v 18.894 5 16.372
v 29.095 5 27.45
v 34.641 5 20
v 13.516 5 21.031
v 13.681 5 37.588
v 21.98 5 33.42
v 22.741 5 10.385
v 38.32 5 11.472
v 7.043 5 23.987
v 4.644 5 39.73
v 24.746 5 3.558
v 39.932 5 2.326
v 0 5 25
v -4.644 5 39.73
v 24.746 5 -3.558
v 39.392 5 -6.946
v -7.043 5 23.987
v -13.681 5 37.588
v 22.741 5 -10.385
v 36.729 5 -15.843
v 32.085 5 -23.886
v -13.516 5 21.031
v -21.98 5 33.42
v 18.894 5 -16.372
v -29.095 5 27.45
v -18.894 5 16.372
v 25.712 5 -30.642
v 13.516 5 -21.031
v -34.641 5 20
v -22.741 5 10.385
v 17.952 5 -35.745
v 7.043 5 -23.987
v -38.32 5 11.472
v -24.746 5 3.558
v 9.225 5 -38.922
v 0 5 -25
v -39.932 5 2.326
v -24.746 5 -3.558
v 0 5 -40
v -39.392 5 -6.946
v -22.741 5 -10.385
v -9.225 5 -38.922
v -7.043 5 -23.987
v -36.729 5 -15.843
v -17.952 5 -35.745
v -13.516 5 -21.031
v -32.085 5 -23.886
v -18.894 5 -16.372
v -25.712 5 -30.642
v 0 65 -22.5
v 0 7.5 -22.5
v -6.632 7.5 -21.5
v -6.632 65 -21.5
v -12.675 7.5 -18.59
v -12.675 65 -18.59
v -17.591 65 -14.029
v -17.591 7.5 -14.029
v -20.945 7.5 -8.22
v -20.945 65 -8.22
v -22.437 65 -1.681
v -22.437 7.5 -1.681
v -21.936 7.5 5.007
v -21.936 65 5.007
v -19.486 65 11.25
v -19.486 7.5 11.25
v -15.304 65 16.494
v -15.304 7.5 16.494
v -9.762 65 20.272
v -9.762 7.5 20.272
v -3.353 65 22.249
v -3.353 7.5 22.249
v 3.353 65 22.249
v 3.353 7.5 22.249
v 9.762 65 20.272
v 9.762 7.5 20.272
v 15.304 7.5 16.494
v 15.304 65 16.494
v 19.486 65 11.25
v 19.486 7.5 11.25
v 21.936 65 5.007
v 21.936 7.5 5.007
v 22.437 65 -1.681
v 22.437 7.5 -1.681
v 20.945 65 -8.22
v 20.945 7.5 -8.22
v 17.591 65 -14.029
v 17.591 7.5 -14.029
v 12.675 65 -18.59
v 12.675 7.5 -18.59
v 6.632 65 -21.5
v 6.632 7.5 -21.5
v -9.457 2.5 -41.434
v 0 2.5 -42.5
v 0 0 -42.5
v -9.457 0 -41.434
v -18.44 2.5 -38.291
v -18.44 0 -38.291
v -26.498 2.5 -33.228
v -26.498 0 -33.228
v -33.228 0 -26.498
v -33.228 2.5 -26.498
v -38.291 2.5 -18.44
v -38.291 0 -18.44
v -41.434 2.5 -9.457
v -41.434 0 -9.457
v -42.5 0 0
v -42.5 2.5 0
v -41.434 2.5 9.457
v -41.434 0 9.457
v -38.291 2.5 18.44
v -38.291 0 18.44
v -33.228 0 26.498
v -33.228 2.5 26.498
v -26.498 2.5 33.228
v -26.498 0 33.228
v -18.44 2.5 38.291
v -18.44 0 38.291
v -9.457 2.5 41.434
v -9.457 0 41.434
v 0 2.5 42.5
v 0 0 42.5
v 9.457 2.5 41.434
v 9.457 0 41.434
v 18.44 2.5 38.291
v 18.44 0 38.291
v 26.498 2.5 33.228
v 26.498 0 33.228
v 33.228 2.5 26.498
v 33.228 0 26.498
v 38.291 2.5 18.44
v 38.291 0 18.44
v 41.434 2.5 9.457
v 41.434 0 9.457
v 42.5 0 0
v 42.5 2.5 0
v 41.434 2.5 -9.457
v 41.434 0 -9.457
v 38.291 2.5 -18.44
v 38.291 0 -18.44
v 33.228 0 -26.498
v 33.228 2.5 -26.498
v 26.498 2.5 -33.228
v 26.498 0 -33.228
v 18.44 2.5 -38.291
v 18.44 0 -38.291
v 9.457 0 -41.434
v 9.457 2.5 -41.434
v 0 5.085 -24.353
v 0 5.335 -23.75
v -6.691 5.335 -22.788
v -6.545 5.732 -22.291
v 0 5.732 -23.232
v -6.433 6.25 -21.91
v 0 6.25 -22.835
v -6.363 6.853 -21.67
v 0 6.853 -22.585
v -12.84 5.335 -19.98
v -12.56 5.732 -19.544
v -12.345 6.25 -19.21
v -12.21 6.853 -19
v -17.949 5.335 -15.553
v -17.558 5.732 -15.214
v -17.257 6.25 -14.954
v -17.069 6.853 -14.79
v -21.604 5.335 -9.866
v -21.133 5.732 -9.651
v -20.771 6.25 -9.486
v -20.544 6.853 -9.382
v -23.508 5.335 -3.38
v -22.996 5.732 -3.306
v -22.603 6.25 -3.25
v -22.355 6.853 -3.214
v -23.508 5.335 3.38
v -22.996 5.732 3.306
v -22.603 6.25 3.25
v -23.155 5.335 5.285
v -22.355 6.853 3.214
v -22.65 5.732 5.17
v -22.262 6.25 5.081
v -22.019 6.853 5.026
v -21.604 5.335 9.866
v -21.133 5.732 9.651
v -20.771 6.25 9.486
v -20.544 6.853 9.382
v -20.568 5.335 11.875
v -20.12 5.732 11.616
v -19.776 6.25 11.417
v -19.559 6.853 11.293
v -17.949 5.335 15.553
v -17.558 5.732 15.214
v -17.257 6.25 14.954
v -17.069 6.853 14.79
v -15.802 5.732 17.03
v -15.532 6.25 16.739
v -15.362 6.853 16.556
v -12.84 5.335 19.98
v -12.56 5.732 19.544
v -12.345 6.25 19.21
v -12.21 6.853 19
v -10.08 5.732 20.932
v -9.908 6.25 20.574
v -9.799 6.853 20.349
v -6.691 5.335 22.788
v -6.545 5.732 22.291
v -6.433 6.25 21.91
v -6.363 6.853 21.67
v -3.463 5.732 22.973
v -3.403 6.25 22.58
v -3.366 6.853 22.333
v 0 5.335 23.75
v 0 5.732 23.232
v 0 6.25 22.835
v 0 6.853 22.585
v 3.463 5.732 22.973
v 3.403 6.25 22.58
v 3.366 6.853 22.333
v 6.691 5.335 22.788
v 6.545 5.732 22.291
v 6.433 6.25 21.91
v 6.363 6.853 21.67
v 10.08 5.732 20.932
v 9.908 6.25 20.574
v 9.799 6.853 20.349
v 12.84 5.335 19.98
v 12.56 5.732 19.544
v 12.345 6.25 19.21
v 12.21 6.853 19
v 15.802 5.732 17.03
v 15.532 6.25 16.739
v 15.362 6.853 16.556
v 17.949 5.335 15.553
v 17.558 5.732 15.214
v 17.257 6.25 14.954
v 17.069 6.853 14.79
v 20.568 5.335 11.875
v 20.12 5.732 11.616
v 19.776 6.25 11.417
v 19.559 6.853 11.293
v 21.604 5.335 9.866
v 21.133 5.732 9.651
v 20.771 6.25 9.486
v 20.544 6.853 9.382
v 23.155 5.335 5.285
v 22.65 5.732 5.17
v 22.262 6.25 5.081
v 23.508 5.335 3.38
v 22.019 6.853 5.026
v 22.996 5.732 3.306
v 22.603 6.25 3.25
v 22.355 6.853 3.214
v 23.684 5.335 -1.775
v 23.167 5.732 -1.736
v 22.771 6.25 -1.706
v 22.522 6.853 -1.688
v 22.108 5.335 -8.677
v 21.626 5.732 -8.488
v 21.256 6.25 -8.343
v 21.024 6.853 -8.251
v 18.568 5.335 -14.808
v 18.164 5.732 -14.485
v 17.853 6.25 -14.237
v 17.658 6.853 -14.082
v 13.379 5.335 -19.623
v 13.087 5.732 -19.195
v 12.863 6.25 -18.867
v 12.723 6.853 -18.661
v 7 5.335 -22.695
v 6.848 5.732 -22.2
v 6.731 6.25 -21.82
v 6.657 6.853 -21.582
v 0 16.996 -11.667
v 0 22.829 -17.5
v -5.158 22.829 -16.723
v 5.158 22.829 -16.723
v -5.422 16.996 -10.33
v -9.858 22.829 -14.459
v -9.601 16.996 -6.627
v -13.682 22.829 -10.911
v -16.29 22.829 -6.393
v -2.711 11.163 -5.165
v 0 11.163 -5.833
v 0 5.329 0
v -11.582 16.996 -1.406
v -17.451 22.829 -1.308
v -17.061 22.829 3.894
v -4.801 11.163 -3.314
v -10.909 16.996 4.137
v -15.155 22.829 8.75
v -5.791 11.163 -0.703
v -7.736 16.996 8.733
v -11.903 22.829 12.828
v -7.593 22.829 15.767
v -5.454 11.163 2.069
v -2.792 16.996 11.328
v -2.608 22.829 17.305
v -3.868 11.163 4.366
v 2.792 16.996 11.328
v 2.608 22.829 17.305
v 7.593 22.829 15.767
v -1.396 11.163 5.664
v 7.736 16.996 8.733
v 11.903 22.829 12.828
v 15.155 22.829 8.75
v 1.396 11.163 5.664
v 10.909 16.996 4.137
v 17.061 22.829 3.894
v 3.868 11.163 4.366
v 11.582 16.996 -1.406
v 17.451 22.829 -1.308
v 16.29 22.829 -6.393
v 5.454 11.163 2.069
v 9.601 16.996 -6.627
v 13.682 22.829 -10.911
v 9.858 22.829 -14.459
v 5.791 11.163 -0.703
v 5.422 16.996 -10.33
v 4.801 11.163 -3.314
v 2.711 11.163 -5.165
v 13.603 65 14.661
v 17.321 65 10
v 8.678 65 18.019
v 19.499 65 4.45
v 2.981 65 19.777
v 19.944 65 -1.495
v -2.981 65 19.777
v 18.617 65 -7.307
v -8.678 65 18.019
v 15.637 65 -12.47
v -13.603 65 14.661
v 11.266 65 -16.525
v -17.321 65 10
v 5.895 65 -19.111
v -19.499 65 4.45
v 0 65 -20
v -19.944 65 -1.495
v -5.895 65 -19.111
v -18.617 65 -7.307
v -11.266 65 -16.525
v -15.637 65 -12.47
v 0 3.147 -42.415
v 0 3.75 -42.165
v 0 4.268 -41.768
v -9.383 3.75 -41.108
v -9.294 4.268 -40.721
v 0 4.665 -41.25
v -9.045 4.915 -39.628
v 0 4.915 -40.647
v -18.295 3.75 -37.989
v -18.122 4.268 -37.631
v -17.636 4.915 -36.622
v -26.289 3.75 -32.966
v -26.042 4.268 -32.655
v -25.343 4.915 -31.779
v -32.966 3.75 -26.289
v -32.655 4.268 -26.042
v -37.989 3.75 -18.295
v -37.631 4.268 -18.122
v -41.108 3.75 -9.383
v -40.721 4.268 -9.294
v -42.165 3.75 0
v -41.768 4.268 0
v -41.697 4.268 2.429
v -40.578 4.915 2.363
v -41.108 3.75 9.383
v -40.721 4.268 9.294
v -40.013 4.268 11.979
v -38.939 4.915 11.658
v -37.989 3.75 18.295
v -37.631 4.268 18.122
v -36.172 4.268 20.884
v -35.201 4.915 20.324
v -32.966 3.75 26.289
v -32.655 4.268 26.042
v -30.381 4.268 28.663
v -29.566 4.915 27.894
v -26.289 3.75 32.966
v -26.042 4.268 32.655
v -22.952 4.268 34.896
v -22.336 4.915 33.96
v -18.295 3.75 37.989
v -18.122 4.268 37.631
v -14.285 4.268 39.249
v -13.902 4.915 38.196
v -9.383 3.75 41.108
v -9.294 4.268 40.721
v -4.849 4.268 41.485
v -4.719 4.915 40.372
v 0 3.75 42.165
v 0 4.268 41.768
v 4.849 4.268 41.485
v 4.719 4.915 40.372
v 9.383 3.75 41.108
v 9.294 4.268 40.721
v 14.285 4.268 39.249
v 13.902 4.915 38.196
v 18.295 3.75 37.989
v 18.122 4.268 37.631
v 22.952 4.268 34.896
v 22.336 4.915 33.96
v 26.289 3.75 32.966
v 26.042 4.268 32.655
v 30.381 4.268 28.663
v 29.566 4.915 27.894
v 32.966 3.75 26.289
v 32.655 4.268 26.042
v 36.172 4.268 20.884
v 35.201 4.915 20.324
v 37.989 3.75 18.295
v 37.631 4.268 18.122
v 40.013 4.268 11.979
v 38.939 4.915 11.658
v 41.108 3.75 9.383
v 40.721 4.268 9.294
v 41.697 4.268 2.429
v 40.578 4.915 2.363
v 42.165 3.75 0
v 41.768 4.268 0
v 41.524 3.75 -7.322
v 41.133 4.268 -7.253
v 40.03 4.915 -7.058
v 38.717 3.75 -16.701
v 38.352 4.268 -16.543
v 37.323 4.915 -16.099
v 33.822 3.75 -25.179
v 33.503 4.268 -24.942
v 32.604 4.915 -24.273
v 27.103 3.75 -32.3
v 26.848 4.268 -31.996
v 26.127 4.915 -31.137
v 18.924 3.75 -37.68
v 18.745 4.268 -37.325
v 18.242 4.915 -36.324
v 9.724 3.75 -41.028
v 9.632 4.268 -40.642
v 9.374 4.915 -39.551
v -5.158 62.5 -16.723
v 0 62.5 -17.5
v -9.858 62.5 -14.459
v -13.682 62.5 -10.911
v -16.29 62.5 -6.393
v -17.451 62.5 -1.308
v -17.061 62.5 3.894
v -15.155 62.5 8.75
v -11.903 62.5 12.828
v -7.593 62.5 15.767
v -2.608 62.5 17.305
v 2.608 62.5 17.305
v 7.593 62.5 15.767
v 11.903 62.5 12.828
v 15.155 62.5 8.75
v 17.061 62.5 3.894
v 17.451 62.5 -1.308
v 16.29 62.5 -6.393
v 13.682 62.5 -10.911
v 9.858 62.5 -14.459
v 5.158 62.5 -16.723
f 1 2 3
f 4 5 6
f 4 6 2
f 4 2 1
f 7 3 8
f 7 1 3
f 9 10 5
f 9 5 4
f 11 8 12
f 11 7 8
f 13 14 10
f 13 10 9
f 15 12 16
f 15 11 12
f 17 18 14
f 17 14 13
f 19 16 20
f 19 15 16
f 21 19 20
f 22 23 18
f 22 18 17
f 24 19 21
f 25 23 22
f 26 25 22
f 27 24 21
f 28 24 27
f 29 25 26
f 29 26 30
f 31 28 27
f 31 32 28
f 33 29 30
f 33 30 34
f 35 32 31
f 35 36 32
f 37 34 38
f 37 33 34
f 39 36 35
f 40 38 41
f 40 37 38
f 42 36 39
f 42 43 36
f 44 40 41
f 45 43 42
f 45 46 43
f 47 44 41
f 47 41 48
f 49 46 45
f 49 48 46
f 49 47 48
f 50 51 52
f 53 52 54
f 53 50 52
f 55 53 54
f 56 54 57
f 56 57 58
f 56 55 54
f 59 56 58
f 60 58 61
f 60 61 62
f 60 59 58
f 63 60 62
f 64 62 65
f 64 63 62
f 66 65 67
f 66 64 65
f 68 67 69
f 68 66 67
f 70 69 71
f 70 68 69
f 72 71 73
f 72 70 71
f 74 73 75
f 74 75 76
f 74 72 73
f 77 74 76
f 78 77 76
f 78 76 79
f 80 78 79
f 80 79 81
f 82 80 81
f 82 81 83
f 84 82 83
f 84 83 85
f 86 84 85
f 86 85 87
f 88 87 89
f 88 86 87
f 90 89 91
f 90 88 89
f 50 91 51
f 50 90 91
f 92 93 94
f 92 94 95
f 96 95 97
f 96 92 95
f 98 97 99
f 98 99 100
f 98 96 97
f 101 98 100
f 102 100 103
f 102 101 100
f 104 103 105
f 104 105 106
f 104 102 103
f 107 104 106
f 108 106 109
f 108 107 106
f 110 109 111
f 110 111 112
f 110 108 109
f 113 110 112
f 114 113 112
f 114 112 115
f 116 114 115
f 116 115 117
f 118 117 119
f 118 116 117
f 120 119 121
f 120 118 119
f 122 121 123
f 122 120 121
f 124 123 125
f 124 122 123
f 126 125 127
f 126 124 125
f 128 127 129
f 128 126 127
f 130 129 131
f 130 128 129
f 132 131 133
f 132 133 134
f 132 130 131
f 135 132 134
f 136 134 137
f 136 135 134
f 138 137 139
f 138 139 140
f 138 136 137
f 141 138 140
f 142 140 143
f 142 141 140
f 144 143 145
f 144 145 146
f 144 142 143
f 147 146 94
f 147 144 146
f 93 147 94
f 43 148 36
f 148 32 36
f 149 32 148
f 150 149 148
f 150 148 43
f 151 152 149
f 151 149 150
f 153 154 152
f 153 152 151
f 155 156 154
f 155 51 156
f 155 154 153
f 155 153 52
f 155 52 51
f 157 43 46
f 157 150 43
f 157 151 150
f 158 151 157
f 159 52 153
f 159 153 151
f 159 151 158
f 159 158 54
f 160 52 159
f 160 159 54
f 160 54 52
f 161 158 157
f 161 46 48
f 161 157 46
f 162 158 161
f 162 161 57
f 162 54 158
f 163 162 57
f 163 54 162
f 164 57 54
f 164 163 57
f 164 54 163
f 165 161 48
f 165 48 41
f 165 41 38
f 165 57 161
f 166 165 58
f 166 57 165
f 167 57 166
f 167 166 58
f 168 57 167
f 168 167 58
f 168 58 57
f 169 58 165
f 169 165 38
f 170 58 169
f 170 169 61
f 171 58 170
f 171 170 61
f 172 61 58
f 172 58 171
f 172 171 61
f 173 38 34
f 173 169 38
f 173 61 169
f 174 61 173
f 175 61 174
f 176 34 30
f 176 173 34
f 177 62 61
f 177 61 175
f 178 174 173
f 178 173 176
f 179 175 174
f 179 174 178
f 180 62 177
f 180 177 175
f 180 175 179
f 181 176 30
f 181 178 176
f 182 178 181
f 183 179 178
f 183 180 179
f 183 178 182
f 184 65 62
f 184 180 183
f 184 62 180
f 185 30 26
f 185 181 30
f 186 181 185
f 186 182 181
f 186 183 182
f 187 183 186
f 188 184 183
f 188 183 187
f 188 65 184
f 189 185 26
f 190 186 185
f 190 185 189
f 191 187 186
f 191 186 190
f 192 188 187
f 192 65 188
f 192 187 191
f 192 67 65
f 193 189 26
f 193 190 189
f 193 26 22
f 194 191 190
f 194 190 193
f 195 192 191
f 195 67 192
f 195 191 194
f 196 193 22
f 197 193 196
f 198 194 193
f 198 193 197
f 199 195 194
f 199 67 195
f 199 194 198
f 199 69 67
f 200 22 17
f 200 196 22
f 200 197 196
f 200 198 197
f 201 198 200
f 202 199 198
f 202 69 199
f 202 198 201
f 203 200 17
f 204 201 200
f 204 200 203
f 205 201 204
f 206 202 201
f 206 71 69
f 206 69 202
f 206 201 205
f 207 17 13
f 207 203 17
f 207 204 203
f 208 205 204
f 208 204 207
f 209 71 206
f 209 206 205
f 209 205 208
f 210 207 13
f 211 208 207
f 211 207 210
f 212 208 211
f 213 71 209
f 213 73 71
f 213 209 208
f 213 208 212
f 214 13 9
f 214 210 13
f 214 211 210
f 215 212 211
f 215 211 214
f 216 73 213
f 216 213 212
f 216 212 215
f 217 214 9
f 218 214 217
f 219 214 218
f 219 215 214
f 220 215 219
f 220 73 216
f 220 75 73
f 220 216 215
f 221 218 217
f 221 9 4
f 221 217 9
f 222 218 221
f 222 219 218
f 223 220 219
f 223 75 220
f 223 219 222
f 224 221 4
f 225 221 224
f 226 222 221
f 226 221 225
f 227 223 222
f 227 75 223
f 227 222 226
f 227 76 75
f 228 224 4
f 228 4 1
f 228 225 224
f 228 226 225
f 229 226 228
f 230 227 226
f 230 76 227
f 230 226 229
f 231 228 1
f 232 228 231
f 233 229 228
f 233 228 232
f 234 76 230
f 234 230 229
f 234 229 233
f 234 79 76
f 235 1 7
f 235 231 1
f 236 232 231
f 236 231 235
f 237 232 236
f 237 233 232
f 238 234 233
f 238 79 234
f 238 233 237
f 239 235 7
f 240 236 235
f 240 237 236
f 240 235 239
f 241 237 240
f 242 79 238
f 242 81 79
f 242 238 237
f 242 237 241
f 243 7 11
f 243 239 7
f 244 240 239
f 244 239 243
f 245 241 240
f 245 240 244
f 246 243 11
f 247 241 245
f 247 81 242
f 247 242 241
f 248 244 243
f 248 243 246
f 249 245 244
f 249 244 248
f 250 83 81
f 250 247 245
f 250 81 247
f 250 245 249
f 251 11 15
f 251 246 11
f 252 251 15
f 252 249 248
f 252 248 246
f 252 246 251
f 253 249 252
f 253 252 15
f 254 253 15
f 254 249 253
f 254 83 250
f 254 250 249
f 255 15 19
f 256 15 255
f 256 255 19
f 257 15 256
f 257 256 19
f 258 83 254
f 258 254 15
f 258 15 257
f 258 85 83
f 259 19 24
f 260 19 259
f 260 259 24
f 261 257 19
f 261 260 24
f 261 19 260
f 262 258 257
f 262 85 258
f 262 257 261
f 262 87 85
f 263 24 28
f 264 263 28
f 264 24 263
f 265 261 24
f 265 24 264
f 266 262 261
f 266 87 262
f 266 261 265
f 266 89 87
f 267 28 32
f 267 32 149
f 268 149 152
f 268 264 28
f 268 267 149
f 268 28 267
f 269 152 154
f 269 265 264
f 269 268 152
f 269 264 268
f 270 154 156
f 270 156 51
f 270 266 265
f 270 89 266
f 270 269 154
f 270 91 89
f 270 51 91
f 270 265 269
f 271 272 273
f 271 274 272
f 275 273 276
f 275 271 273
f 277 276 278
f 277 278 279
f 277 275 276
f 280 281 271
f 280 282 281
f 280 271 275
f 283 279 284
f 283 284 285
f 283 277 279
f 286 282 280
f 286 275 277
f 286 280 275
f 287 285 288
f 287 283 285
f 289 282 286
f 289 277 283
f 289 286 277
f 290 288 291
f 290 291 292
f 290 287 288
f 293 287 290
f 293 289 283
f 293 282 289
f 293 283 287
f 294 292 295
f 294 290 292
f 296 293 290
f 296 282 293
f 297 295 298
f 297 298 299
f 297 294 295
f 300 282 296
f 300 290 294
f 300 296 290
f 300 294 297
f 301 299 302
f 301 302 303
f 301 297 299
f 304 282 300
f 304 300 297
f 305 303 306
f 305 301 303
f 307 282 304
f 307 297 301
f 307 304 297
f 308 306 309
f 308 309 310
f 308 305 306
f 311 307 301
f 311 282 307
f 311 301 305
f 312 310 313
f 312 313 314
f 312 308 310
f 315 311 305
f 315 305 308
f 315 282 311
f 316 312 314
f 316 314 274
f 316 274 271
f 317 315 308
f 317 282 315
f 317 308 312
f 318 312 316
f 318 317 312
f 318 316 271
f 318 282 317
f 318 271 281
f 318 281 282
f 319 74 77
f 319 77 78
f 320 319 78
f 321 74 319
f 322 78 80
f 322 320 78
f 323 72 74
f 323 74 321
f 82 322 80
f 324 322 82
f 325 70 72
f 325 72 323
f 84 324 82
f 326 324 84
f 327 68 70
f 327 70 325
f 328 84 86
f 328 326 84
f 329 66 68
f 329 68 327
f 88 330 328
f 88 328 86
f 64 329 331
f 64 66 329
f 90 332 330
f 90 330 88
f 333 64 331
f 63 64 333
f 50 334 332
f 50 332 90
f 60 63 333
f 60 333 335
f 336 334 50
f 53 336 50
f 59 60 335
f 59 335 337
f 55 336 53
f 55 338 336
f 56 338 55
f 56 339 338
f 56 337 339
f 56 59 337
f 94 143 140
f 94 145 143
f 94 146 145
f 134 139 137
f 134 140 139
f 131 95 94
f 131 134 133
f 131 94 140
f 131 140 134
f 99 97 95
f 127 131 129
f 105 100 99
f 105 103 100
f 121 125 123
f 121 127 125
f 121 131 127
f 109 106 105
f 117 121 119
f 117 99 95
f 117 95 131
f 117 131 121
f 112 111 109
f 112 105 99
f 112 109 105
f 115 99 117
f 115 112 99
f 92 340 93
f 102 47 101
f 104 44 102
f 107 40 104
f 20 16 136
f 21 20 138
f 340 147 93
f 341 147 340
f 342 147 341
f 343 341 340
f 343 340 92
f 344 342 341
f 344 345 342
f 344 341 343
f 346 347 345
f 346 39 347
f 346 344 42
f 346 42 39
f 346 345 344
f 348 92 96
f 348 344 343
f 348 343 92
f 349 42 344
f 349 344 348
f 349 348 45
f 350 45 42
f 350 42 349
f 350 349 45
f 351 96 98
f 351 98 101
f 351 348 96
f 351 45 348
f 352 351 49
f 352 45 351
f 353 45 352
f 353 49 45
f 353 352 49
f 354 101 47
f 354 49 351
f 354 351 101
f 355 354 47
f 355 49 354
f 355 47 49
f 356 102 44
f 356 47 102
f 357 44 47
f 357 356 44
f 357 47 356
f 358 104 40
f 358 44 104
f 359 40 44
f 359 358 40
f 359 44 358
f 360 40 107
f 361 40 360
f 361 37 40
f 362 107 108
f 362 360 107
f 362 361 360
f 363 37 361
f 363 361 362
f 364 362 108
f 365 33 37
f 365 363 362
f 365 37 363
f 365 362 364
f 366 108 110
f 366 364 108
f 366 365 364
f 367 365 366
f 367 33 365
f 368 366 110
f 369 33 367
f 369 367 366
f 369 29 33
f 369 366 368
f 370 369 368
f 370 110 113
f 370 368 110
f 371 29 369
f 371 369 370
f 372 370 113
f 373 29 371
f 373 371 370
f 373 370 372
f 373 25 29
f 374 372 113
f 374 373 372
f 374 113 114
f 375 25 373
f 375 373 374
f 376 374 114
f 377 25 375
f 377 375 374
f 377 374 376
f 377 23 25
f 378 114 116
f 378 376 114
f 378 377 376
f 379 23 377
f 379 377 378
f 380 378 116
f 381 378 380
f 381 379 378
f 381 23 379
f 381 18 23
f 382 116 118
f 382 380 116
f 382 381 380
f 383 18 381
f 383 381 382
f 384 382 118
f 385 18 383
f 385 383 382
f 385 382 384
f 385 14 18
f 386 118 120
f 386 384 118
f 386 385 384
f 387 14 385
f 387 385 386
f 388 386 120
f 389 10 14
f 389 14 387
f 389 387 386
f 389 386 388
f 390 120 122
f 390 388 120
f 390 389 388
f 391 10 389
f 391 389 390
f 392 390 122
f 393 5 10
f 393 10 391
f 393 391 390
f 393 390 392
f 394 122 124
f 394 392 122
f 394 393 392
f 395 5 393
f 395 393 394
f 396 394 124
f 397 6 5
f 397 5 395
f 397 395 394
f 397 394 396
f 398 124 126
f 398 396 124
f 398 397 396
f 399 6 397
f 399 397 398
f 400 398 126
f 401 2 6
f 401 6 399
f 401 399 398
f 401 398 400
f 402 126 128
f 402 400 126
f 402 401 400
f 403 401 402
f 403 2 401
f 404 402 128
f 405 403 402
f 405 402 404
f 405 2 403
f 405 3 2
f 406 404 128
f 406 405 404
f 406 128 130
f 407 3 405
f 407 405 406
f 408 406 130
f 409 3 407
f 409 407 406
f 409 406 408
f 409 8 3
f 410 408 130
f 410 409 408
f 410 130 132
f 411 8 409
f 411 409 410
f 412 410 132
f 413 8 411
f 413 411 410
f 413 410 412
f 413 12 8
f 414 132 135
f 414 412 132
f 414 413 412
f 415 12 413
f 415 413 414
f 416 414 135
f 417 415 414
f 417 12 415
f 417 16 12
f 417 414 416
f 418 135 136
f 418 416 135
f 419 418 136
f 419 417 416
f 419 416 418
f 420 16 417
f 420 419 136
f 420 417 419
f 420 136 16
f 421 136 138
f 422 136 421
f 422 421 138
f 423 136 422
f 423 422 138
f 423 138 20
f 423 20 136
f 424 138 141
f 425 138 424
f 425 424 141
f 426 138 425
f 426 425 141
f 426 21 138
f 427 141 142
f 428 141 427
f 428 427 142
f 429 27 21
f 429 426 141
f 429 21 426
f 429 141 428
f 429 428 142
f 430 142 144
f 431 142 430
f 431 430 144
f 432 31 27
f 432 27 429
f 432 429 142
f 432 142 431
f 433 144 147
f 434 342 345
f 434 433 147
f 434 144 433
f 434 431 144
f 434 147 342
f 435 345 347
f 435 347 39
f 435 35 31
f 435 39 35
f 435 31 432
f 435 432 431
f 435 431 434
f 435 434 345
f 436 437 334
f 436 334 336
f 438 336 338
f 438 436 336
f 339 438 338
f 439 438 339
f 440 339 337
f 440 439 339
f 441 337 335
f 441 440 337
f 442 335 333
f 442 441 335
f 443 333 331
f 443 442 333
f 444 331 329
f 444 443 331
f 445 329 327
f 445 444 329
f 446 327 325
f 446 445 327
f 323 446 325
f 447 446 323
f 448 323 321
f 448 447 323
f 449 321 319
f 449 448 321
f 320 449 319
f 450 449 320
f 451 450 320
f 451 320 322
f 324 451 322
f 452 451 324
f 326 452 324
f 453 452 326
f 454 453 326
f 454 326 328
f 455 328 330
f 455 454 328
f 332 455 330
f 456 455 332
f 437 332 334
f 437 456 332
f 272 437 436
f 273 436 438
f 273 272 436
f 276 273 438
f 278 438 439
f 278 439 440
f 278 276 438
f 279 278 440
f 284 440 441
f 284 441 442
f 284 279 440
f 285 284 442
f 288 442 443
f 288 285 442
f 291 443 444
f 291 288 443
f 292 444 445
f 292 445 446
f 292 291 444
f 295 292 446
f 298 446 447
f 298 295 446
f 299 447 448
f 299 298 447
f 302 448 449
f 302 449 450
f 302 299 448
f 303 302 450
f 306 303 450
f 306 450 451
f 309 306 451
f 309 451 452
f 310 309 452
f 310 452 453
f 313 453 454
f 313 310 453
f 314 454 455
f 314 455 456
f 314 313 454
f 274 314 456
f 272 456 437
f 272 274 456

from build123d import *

# Parameters (mm, degrees)
FILLET1_R     = 2.5
CHAMFER2_SIZE = 2.5


with BuildPart() as part:
    # Sketch1 → Revolve1 (revolve)
    with BuildSketch(Plane.XY, mode=Mode.PRIVATE) as revolve1_sk:
        Polygon((0, 0), (42.5, 0), (42.5, 5), (22.5, 5), (22.5, 5.29877748), (22.5, 65), (17.5, 65), (17.5, 22.82917197), (0, 5.32917197), align=None)
    revolve(revolve1_sk.sketch.rotate(Axis((0, 0, 0), (0, 1, 0)), 90), axis=Axis((0, 0, 0), (0, 1, 0)))

    # Fillet1
    fillet1_edges = [part.edges().sort_by_distance(p)[0] for p in [
        (0, 5, 42.5),
        (0, 5, 22.5),
    ]]
    fillet(fillet1_edges, radius=FILLET1_R)

    # Chamfer2
    chamfer2_edges = [part.edges().sort_by_distance(p)[0] for p in [
        (0, 65, 17.5),
    ]]
    chamfer(chamfer2_edges, length=CHAMFER2_SIZE)


solid = part.part
